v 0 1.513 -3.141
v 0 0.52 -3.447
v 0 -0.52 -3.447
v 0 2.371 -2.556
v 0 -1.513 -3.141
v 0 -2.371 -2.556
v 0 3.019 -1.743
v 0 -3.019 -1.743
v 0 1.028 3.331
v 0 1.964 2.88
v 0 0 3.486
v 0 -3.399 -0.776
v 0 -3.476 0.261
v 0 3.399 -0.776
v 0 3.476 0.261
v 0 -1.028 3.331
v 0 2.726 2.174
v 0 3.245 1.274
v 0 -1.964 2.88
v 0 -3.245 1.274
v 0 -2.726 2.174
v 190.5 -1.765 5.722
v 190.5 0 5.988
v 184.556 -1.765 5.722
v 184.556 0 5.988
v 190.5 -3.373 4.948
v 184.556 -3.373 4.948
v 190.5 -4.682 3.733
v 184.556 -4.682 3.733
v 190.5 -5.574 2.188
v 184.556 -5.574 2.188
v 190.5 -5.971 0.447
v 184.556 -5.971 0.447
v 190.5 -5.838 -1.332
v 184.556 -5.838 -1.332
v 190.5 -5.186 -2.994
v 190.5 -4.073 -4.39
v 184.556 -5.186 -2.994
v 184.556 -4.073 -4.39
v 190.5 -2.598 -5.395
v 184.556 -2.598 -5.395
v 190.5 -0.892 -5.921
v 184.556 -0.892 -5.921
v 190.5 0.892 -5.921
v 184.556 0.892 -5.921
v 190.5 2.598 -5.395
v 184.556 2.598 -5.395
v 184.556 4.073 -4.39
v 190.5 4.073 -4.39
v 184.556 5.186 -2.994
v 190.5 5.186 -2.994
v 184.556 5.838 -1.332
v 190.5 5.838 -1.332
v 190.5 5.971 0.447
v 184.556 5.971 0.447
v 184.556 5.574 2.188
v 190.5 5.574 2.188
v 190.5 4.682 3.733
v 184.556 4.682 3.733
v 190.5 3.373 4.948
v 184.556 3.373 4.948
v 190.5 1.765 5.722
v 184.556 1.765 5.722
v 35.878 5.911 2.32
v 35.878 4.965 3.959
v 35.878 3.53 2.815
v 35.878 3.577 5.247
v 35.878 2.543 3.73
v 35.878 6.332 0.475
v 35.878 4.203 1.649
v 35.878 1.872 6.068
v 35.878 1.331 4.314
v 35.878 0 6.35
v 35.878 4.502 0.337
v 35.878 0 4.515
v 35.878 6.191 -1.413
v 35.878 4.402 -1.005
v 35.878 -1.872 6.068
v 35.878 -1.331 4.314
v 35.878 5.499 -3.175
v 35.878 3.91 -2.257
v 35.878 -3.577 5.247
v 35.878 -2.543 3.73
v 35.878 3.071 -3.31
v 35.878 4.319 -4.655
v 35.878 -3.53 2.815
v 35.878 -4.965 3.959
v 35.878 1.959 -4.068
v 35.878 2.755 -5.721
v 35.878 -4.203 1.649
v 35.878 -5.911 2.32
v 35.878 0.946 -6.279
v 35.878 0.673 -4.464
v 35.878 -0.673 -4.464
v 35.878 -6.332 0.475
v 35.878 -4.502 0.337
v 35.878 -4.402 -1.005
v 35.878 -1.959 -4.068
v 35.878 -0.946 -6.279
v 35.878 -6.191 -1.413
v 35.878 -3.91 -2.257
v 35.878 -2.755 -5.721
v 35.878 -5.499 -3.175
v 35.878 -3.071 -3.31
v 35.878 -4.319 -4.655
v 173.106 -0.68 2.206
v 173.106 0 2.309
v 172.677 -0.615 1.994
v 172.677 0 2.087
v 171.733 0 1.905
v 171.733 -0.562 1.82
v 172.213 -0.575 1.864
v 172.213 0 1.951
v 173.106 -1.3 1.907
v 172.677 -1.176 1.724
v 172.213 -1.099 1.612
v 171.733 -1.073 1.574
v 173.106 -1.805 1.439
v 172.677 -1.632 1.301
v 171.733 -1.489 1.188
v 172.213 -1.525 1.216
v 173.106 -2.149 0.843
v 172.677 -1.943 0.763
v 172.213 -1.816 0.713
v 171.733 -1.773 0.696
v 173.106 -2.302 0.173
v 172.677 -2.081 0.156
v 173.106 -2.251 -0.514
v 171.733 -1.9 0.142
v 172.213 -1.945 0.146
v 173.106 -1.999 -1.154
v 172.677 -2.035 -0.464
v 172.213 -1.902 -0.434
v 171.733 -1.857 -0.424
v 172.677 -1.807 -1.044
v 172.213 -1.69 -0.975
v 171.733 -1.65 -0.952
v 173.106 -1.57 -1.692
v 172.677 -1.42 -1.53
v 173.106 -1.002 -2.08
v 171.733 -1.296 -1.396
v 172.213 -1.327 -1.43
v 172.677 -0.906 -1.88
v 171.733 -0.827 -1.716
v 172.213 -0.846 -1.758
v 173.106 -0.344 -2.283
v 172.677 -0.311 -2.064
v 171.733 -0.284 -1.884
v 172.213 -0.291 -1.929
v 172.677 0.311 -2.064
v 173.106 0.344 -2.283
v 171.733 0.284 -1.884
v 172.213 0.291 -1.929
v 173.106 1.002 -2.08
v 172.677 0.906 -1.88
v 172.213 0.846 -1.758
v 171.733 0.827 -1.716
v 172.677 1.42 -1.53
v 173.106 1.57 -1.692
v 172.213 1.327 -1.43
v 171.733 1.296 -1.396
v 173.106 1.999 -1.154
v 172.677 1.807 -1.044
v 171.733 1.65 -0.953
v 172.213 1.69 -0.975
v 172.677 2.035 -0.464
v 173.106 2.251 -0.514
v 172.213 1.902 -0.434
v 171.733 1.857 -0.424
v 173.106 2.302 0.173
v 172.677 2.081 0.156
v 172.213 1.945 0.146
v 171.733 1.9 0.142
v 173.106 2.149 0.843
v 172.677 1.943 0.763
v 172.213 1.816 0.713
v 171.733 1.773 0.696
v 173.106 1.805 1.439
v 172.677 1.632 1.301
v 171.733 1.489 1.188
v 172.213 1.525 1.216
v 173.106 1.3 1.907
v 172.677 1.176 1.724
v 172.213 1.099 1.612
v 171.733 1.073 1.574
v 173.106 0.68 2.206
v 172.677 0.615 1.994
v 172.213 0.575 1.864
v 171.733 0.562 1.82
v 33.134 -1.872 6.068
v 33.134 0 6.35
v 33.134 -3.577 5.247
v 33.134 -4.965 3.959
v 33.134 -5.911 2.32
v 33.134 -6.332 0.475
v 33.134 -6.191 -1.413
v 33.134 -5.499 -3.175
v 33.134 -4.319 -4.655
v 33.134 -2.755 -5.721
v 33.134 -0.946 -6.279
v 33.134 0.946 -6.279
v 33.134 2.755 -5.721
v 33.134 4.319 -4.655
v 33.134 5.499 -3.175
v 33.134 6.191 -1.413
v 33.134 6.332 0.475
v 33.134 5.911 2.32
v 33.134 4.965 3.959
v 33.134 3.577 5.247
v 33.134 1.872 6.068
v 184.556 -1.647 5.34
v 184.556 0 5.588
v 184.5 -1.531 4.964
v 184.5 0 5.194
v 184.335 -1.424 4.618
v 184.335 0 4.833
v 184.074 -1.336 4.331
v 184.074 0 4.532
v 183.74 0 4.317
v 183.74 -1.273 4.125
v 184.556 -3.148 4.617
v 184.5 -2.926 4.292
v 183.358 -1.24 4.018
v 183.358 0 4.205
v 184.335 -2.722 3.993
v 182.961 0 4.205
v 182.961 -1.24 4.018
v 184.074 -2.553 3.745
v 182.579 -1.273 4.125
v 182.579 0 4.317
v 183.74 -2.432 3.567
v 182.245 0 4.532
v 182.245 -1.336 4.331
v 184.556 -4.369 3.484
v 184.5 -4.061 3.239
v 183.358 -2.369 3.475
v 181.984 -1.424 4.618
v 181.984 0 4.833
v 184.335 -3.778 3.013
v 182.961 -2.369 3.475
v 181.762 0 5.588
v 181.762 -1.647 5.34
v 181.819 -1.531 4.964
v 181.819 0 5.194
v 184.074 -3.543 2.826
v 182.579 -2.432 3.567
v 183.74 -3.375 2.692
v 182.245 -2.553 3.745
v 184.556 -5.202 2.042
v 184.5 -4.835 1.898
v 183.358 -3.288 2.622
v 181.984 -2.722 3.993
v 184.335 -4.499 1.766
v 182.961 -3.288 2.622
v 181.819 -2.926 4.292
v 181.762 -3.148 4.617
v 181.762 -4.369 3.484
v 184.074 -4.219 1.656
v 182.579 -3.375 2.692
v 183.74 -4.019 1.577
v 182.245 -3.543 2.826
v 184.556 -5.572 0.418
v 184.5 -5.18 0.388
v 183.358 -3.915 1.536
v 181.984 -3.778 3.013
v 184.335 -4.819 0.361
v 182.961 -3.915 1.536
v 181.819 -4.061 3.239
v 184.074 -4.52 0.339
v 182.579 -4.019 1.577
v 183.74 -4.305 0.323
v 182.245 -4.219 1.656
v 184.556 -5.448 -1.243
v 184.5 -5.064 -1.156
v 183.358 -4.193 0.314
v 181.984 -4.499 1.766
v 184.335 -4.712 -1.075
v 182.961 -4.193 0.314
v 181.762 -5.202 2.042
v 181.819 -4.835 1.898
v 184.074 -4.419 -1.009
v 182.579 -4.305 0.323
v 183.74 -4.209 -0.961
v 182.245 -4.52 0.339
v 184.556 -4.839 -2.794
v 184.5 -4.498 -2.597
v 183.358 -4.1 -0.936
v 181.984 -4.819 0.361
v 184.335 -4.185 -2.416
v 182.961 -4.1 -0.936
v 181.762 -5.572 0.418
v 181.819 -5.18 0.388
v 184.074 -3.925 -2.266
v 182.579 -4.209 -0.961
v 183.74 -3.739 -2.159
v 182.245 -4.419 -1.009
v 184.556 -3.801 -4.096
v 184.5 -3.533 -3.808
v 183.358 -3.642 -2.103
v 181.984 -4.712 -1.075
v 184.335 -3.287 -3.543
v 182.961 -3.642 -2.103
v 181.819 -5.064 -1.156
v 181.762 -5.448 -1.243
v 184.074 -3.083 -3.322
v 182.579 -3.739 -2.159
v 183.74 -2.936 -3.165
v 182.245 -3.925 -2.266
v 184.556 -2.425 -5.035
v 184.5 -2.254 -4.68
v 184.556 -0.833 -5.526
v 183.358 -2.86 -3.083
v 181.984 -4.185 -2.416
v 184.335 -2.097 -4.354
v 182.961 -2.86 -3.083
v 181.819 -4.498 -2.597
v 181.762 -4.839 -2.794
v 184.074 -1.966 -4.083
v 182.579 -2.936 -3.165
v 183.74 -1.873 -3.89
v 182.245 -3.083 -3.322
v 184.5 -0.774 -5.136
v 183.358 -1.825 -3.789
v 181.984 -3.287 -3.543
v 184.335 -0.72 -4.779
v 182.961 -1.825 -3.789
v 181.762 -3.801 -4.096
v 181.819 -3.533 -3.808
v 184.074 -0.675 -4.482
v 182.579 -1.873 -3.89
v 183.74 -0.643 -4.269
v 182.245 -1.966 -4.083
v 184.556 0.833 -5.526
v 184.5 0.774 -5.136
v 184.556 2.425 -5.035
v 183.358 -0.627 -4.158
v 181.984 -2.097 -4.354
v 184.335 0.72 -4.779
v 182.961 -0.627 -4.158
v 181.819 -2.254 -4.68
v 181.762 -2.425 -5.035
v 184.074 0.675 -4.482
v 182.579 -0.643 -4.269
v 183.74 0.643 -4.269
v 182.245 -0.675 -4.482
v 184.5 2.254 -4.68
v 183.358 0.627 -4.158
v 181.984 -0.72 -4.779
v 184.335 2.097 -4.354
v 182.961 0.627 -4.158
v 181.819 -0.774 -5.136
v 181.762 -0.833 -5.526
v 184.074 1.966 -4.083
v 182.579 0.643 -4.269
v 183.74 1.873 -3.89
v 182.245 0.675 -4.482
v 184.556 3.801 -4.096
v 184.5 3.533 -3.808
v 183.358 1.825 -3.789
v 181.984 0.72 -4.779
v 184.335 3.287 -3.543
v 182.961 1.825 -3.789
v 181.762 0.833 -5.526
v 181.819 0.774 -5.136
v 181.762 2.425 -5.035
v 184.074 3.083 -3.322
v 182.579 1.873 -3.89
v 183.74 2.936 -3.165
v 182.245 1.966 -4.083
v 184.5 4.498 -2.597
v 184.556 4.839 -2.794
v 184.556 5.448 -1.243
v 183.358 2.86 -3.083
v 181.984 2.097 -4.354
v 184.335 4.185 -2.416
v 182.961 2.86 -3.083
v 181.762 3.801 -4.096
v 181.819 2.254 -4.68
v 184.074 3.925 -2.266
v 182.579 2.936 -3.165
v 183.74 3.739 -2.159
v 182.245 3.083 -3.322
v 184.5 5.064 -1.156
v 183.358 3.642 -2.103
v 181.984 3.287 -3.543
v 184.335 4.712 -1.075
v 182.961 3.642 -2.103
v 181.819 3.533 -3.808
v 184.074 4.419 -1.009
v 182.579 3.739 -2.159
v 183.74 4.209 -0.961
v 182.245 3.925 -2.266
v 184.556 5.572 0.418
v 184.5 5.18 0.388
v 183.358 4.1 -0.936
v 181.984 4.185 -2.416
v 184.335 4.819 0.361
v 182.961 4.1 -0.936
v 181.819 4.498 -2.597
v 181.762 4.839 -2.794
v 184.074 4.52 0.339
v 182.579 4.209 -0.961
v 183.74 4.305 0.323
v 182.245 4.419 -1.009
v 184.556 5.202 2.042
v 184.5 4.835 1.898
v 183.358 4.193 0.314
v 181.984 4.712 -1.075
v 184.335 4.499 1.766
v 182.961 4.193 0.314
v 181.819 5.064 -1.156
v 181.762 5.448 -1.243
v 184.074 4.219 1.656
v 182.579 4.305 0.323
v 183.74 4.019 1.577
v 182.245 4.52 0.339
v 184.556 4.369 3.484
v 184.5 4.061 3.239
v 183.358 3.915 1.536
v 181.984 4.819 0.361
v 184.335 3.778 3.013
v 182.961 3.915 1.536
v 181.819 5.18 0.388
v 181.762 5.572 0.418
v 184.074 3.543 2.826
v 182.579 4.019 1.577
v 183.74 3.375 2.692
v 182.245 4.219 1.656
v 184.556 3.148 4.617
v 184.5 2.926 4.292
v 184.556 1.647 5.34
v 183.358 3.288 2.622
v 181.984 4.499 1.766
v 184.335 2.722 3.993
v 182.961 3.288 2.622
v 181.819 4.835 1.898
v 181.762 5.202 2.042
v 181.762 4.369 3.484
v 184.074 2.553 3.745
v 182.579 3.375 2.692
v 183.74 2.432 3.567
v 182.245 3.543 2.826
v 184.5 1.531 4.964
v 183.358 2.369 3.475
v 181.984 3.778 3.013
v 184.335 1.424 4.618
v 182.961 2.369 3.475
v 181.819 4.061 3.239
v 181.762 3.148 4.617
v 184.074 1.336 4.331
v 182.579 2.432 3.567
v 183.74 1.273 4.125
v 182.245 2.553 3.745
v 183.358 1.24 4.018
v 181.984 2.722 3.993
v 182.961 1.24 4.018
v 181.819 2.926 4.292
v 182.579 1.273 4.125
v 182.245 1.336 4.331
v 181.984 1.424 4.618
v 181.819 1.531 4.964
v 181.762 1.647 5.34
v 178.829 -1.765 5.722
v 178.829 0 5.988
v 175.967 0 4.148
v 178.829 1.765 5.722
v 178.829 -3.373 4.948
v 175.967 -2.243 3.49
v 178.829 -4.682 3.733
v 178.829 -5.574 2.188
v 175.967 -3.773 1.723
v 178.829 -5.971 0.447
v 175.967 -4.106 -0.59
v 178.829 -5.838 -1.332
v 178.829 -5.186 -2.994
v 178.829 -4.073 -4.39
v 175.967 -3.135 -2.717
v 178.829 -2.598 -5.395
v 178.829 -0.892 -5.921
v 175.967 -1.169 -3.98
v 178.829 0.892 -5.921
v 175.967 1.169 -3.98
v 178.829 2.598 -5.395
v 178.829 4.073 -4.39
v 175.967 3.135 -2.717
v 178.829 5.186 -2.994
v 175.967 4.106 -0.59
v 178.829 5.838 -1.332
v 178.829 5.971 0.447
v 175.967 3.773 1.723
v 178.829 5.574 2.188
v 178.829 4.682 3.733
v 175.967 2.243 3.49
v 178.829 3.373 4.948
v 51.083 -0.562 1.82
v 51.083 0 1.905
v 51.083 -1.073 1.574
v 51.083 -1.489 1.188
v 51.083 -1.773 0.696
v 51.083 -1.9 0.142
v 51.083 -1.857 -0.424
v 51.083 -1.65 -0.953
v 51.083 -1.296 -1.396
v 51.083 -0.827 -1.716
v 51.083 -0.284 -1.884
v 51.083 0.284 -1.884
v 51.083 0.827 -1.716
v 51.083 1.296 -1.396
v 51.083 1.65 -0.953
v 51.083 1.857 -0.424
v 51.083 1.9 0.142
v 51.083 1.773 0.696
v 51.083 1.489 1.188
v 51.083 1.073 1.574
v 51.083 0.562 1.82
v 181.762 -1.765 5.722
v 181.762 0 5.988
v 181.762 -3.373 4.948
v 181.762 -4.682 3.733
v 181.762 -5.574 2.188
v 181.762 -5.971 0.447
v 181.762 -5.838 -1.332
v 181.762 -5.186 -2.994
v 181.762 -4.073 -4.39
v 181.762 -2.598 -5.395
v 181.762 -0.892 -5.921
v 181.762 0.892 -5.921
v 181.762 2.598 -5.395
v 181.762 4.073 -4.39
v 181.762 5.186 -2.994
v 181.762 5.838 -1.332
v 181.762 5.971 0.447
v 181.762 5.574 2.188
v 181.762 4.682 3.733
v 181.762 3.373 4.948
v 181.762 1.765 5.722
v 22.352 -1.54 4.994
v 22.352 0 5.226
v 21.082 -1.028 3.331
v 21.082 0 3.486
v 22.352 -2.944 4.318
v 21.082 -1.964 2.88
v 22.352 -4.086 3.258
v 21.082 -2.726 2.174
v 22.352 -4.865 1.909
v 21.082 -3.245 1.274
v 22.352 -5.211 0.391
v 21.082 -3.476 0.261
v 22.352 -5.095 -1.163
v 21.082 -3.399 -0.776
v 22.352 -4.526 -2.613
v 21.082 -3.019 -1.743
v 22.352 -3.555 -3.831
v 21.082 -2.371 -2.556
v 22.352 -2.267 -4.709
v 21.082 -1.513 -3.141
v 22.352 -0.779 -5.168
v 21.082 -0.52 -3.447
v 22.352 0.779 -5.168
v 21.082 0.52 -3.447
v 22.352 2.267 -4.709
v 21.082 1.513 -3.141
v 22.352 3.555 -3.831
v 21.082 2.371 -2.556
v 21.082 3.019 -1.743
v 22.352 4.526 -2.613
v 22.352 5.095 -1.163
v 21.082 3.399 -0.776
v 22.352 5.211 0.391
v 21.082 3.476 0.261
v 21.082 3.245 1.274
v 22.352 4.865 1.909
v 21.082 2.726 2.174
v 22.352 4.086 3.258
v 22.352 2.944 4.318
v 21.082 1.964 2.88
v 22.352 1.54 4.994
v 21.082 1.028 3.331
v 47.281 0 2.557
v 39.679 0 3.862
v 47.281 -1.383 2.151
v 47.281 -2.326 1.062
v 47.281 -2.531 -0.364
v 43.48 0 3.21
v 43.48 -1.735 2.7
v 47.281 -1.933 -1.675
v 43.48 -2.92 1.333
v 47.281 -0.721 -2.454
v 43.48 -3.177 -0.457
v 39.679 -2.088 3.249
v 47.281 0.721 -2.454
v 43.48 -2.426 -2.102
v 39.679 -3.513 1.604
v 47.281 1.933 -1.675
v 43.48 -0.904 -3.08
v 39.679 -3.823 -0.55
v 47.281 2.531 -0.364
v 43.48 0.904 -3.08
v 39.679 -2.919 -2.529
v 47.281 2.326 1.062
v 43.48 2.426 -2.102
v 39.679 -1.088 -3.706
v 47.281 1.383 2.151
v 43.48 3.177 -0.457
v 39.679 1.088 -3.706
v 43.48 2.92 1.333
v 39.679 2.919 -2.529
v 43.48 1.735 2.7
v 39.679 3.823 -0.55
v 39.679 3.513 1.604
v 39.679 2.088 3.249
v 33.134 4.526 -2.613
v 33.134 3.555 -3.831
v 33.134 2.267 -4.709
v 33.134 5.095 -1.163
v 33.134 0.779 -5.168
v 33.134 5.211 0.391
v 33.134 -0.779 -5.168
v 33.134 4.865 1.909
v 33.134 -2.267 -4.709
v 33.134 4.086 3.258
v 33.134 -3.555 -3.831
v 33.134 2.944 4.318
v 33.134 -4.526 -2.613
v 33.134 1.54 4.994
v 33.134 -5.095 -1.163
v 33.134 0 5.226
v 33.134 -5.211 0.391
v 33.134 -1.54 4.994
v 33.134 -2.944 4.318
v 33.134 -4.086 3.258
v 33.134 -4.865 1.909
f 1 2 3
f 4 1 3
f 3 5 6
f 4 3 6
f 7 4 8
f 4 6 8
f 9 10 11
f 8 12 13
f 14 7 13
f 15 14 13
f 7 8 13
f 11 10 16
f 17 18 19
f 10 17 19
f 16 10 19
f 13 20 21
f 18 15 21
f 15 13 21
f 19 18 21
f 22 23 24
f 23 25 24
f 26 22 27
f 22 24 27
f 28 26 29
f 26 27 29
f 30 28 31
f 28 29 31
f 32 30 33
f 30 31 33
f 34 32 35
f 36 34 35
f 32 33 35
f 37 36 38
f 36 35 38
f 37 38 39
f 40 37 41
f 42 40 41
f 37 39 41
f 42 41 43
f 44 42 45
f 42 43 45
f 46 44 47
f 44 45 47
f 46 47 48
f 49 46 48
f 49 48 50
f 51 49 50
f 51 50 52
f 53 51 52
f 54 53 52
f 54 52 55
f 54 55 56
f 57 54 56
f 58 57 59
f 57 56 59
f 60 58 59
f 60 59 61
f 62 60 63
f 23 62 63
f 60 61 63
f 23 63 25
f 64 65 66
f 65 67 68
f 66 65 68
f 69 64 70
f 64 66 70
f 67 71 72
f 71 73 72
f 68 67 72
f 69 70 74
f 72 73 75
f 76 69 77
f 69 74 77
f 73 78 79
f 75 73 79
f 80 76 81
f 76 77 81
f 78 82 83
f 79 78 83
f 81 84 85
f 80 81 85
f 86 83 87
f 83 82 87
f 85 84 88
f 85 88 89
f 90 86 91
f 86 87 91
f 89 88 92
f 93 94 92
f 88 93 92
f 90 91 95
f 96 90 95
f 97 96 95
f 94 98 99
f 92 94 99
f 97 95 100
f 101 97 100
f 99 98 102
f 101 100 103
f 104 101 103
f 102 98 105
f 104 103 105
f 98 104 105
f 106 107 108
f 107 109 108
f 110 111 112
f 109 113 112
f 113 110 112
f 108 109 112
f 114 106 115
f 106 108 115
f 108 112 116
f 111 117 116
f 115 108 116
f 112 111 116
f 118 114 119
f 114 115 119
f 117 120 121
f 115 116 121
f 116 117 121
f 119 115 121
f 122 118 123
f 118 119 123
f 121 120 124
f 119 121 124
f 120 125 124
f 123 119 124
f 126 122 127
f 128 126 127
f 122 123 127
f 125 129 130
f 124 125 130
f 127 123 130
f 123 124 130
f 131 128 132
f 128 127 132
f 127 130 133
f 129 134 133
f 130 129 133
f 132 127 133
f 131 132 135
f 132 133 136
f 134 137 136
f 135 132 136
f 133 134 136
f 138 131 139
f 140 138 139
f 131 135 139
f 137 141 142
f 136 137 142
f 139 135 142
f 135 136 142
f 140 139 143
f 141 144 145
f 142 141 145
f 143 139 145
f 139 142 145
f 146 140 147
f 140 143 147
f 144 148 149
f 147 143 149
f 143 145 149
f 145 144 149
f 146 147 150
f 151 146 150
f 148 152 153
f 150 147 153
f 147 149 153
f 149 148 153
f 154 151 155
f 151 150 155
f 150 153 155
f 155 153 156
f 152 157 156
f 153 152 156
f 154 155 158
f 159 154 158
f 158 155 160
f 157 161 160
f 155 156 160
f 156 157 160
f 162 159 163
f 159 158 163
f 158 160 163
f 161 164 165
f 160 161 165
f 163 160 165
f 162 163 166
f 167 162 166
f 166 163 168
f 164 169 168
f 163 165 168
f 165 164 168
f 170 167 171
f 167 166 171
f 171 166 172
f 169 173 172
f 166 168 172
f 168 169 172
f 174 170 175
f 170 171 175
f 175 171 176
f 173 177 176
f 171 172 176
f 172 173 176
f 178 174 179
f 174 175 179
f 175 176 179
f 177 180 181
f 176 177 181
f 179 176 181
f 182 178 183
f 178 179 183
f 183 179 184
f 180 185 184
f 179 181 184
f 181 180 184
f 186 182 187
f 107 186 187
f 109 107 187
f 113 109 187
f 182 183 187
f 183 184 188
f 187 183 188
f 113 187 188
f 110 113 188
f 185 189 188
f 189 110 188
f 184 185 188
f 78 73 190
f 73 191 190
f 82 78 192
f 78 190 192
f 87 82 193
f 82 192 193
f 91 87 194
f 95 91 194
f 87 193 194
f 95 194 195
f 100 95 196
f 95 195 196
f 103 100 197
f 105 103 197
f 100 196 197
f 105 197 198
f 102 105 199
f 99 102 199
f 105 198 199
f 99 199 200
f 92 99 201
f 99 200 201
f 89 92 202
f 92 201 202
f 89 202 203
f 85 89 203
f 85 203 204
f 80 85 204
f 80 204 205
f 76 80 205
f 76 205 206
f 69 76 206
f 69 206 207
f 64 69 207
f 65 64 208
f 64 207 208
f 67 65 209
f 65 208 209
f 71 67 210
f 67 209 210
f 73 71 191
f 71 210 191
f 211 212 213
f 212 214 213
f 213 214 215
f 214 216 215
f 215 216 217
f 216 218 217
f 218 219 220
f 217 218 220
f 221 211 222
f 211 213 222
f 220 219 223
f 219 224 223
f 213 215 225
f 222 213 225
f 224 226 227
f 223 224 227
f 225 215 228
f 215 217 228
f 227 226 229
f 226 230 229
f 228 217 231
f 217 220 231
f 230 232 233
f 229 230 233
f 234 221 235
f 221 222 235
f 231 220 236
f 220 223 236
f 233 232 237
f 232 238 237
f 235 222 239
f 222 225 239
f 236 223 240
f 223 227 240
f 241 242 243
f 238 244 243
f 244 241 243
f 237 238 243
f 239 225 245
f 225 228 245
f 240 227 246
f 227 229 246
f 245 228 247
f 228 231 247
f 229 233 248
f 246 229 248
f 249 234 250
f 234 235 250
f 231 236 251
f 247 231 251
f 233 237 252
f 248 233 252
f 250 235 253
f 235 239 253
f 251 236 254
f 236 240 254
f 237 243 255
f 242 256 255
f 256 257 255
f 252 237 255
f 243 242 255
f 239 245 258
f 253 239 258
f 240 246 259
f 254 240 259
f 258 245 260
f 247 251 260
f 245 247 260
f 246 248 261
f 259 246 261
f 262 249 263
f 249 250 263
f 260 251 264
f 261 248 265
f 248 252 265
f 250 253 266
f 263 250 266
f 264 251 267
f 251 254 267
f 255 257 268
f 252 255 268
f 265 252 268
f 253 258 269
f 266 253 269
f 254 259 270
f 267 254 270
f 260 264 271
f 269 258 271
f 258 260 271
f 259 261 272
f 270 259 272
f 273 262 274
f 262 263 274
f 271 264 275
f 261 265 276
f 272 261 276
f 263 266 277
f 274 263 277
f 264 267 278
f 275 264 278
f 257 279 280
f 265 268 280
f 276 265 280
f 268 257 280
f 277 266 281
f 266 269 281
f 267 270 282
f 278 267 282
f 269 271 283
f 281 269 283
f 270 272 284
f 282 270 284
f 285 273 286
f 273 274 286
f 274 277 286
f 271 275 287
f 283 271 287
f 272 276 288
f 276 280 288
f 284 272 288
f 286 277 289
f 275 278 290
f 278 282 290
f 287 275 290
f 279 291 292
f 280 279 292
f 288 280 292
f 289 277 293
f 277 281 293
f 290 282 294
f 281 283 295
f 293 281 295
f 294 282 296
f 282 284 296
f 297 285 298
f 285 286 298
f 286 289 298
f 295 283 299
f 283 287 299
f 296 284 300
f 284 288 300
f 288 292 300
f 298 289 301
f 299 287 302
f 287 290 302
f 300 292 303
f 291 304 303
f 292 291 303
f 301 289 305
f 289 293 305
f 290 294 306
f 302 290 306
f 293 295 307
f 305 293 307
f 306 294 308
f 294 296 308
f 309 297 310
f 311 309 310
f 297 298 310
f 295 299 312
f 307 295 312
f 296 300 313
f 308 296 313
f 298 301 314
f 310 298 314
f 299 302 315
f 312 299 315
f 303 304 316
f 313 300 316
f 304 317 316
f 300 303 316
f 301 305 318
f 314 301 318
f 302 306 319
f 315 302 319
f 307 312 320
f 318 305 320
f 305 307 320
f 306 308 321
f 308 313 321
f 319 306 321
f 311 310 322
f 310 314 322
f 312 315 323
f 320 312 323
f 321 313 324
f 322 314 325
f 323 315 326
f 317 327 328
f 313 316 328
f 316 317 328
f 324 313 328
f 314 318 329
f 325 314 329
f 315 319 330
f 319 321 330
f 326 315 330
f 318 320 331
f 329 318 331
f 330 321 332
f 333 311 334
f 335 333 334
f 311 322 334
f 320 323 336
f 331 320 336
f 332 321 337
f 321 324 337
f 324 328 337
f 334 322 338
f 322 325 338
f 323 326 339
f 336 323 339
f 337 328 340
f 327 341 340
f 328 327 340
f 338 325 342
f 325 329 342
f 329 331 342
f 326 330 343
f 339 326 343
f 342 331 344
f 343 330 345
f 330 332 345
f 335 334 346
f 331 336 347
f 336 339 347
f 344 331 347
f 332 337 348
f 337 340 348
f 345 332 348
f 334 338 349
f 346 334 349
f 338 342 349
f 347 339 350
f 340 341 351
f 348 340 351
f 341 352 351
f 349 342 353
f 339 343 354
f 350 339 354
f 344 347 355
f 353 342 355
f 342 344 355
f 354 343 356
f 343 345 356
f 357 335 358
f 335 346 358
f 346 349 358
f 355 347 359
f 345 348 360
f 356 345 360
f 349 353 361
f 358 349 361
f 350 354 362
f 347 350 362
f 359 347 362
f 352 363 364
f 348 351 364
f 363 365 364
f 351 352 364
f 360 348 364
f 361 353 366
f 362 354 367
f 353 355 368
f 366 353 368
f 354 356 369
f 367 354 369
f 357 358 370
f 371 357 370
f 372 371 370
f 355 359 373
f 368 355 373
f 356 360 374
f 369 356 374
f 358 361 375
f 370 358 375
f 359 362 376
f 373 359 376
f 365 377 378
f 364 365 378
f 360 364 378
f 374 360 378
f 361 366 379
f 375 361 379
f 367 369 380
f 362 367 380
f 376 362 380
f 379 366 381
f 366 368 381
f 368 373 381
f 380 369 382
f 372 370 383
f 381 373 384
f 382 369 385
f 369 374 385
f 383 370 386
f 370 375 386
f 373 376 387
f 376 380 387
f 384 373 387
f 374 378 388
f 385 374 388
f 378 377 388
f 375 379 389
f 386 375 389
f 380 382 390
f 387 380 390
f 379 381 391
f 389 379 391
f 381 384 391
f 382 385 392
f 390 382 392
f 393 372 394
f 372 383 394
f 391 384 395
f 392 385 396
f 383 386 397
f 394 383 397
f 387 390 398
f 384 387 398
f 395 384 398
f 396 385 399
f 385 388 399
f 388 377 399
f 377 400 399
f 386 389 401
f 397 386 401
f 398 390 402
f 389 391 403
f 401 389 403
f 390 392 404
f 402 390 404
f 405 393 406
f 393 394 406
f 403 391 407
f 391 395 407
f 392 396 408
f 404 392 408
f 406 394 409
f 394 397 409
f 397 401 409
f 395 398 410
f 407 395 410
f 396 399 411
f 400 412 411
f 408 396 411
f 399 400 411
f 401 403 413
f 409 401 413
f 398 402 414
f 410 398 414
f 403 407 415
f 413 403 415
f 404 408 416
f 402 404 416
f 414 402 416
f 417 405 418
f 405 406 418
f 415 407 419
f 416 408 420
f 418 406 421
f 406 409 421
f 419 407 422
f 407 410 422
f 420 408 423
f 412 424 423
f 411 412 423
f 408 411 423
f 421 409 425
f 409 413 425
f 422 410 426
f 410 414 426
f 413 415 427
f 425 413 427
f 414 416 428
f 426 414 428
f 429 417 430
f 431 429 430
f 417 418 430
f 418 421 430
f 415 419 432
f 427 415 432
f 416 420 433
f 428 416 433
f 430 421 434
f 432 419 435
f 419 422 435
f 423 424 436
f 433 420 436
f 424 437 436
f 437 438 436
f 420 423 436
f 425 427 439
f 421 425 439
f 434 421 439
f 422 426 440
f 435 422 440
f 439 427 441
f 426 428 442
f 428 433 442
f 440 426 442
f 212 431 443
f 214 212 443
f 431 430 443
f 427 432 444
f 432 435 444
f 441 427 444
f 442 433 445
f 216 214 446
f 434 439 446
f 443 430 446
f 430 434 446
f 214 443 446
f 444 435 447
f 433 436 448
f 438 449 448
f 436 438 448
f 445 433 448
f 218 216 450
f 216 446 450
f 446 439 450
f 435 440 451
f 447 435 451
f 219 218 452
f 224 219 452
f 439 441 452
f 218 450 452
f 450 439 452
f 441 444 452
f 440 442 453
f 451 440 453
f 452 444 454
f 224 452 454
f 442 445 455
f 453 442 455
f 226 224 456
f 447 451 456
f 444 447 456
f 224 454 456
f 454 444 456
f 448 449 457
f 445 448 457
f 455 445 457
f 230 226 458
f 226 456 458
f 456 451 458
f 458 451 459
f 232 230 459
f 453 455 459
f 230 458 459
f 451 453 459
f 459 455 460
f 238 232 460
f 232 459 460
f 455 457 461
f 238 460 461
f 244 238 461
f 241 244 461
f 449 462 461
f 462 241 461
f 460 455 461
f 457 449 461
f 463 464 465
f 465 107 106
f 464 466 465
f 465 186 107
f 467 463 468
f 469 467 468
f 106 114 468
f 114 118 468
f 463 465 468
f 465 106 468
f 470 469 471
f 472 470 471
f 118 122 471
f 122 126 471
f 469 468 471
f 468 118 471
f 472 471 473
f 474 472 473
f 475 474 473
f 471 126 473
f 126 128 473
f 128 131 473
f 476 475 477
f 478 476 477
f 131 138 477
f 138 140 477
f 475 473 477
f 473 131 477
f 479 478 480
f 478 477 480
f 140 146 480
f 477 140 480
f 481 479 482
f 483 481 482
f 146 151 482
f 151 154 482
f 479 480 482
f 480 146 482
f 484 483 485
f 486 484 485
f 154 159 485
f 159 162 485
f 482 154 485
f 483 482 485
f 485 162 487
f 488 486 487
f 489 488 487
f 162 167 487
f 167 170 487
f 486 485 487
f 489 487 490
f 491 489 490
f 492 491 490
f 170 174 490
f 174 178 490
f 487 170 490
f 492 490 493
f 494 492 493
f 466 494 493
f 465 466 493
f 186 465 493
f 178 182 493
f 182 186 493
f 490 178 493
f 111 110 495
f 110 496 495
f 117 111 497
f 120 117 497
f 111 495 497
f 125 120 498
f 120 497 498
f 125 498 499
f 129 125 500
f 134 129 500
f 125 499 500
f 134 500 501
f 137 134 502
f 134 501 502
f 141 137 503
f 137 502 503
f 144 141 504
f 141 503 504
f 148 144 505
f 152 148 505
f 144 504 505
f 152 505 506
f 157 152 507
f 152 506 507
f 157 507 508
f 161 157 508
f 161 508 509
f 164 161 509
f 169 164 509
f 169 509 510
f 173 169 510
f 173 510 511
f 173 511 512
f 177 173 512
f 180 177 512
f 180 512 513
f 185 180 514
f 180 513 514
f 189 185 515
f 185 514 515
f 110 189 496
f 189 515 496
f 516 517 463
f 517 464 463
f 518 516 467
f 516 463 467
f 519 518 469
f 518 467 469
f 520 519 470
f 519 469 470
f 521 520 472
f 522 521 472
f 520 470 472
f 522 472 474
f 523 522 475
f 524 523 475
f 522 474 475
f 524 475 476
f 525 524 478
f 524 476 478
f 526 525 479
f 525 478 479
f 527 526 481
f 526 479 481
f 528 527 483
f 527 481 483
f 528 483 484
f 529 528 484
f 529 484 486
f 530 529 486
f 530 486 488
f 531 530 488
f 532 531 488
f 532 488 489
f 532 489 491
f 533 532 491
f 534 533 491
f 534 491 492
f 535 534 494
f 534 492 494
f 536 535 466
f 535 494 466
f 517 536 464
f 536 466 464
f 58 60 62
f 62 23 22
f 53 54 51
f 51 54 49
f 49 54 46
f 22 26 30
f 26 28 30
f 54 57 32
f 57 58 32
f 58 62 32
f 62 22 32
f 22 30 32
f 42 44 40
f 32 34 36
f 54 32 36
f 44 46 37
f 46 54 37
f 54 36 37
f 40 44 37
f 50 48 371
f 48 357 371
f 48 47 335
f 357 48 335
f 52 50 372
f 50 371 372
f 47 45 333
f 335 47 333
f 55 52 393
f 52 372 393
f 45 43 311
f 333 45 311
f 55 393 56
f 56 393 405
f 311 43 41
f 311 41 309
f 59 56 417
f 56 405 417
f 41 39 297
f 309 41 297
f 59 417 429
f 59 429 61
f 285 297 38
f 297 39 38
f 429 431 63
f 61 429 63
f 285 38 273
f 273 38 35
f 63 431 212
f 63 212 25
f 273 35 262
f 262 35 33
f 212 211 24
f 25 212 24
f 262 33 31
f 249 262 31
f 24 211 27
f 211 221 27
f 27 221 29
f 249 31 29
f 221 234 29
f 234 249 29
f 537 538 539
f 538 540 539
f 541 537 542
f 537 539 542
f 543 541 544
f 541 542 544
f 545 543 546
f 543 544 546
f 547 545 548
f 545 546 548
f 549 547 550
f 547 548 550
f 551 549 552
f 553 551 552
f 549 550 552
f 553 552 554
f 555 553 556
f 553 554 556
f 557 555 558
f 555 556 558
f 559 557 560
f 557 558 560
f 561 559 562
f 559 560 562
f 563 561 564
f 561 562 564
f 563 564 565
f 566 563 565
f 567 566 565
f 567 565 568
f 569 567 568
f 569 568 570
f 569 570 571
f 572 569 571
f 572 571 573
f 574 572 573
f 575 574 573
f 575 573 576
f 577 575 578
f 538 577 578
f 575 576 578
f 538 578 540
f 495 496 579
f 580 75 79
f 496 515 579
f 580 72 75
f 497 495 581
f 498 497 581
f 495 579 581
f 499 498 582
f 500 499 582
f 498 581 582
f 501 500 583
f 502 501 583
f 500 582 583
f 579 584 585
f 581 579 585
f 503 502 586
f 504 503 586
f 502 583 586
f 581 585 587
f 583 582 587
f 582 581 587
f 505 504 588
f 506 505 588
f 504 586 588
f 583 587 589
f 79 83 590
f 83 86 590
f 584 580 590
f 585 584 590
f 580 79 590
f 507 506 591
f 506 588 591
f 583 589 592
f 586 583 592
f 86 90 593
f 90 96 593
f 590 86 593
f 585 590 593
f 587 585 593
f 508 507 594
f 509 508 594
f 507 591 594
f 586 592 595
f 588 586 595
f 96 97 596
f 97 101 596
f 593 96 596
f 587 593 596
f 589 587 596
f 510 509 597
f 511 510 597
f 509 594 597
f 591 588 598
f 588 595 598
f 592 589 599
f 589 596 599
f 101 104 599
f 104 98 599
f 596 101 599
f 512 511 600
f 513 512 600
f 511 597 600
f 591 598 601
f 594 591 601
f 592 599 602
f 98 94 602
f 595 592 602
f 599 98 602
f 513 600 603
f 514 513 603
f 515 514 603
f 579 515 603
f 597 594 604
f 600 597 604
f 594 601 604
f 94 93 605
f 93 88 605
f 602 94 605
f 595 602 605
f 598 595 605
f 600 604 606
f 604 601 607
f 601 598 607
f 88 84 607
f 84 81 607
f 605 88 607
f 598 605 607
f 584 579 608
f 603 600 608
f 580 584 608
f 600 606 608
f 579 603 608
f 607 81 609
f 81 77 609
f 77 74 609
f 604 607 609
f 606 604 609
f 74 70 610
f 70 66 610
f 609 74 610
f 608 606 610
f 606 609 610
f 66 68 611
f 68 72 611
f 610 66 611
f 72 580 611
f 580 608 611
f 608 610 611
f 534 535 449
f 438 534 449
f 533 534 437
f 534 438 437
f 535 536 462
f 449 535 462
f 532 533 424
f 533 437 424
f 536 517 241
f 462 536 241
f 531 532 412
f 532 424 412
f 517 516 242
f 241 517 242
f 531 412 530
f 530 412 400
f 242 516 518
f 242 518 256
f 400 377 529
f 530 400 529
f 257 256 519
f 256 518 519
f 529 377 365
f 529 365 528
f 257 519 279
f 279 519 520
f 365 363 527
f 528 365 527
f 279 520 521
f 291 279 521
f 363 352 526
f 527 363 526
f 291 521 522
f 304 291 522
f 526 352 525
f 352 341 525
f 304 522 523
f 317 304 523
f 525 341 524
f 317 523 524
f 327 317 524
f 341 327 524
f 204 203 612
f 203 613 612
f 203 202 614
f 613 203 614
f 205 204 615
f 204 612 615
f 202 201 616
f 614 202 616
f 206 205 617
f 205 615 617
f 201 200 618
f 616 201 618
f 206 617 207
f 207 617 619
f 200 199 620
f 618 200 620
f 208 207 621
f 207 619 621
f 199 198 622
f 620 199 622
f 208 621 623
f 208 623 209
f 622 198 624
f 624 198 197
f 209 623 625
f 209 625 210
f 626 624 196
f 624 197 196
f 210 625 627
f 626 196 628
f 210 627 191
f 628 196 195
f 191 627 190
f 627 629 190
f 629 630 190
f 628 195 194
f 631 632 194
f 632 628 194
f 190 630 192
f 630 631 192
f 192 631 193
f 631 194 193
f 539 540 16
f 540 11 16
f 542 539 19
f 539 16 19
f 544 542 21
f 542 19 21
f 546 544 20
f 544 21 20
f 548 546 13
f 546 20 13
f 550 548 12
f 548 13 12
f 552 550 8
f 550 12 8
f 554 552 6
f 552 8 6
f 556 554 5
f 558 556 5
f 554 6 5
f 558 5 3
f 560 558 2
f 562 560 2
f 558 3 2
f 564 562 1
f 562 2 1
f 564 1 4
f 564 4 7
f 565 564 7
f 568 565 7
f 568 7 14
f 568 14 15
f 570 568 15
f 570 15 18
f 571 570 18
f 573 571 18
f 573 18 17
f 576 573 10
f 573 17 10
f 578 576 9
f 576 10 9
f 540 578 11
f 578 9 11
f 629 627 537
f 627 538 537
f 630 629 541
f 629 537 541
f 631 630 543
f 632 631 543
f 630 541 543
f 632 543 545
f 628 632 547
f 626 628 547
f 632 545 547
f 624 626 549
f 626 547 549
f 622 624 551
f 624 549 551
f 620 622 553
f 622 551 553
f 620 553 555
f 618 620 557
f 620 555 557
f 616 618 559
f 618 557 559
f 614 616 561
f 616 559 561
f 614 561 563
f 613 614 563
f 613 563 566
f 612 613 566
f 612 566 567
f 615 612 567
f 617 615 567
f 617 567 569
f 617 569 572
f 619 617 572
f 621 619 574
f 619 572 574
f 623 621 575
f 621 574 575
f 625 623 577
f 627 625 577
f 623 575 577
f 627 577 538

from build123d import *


with BuildPart() as part:
    # Sketch2 → Revolve2 (revolve)
    with BuildSketch(Plane.XY, mode=Mode.PRIVATE) as revolve2_sk:
        with BuildLine():
            Line((190.5, 0), (190.5, 5.98805))
            Line((190.5, 5.98805), (184.5564, 5.98805))
            Line((184.5564, 5.98805), (184.5564, 5.588))
            ThreePointArc((184.5564, 5.588), (183.1594, 4.191), (181.7624, 5.588))
            Line((181.7624, 5.588), (181.7624, 5.98805))
            Line((181.7624, 5.98805), (178.8287, 5.98805))
            Line((178.8287, 5.98805), (173.106298001, 2.308545514))
            ThreePointArc((173.106298001, 2.308545514), (172.448450778, 2.007973698), (171.732557766, 1.905))
            Line((171.732557766, 1.905), (51.082557766, 1.905))
            Line((51.082557766, 1.905), (35.8775, 4.51485))
            Line((35.8775, 4.51485), (35.8775, 6.35))
            Line((35.8775, 6.35), (33.1343, 6.35))
            Line((33.1343, 6.35), (33.1343, 5.22605))
            Line((33.1343, 5.22605), (22.352, 5.22605))
            Line((22.352, 5.22605), (21.082, 3.48615))
            Line((21.082, 3.48615), (0, 3.48615))
            Line((0, 3.48615), (0, 0))
            Line((0, 0), (190.5, 0))
        make_face()
    revolve(revolve2_sk.sketch.rotate(Axis((0, 0, 0), (1, 0, 0)), 90), axis=Axis((0, 0, 0), (1, 0, 0)))


solid = part.part
